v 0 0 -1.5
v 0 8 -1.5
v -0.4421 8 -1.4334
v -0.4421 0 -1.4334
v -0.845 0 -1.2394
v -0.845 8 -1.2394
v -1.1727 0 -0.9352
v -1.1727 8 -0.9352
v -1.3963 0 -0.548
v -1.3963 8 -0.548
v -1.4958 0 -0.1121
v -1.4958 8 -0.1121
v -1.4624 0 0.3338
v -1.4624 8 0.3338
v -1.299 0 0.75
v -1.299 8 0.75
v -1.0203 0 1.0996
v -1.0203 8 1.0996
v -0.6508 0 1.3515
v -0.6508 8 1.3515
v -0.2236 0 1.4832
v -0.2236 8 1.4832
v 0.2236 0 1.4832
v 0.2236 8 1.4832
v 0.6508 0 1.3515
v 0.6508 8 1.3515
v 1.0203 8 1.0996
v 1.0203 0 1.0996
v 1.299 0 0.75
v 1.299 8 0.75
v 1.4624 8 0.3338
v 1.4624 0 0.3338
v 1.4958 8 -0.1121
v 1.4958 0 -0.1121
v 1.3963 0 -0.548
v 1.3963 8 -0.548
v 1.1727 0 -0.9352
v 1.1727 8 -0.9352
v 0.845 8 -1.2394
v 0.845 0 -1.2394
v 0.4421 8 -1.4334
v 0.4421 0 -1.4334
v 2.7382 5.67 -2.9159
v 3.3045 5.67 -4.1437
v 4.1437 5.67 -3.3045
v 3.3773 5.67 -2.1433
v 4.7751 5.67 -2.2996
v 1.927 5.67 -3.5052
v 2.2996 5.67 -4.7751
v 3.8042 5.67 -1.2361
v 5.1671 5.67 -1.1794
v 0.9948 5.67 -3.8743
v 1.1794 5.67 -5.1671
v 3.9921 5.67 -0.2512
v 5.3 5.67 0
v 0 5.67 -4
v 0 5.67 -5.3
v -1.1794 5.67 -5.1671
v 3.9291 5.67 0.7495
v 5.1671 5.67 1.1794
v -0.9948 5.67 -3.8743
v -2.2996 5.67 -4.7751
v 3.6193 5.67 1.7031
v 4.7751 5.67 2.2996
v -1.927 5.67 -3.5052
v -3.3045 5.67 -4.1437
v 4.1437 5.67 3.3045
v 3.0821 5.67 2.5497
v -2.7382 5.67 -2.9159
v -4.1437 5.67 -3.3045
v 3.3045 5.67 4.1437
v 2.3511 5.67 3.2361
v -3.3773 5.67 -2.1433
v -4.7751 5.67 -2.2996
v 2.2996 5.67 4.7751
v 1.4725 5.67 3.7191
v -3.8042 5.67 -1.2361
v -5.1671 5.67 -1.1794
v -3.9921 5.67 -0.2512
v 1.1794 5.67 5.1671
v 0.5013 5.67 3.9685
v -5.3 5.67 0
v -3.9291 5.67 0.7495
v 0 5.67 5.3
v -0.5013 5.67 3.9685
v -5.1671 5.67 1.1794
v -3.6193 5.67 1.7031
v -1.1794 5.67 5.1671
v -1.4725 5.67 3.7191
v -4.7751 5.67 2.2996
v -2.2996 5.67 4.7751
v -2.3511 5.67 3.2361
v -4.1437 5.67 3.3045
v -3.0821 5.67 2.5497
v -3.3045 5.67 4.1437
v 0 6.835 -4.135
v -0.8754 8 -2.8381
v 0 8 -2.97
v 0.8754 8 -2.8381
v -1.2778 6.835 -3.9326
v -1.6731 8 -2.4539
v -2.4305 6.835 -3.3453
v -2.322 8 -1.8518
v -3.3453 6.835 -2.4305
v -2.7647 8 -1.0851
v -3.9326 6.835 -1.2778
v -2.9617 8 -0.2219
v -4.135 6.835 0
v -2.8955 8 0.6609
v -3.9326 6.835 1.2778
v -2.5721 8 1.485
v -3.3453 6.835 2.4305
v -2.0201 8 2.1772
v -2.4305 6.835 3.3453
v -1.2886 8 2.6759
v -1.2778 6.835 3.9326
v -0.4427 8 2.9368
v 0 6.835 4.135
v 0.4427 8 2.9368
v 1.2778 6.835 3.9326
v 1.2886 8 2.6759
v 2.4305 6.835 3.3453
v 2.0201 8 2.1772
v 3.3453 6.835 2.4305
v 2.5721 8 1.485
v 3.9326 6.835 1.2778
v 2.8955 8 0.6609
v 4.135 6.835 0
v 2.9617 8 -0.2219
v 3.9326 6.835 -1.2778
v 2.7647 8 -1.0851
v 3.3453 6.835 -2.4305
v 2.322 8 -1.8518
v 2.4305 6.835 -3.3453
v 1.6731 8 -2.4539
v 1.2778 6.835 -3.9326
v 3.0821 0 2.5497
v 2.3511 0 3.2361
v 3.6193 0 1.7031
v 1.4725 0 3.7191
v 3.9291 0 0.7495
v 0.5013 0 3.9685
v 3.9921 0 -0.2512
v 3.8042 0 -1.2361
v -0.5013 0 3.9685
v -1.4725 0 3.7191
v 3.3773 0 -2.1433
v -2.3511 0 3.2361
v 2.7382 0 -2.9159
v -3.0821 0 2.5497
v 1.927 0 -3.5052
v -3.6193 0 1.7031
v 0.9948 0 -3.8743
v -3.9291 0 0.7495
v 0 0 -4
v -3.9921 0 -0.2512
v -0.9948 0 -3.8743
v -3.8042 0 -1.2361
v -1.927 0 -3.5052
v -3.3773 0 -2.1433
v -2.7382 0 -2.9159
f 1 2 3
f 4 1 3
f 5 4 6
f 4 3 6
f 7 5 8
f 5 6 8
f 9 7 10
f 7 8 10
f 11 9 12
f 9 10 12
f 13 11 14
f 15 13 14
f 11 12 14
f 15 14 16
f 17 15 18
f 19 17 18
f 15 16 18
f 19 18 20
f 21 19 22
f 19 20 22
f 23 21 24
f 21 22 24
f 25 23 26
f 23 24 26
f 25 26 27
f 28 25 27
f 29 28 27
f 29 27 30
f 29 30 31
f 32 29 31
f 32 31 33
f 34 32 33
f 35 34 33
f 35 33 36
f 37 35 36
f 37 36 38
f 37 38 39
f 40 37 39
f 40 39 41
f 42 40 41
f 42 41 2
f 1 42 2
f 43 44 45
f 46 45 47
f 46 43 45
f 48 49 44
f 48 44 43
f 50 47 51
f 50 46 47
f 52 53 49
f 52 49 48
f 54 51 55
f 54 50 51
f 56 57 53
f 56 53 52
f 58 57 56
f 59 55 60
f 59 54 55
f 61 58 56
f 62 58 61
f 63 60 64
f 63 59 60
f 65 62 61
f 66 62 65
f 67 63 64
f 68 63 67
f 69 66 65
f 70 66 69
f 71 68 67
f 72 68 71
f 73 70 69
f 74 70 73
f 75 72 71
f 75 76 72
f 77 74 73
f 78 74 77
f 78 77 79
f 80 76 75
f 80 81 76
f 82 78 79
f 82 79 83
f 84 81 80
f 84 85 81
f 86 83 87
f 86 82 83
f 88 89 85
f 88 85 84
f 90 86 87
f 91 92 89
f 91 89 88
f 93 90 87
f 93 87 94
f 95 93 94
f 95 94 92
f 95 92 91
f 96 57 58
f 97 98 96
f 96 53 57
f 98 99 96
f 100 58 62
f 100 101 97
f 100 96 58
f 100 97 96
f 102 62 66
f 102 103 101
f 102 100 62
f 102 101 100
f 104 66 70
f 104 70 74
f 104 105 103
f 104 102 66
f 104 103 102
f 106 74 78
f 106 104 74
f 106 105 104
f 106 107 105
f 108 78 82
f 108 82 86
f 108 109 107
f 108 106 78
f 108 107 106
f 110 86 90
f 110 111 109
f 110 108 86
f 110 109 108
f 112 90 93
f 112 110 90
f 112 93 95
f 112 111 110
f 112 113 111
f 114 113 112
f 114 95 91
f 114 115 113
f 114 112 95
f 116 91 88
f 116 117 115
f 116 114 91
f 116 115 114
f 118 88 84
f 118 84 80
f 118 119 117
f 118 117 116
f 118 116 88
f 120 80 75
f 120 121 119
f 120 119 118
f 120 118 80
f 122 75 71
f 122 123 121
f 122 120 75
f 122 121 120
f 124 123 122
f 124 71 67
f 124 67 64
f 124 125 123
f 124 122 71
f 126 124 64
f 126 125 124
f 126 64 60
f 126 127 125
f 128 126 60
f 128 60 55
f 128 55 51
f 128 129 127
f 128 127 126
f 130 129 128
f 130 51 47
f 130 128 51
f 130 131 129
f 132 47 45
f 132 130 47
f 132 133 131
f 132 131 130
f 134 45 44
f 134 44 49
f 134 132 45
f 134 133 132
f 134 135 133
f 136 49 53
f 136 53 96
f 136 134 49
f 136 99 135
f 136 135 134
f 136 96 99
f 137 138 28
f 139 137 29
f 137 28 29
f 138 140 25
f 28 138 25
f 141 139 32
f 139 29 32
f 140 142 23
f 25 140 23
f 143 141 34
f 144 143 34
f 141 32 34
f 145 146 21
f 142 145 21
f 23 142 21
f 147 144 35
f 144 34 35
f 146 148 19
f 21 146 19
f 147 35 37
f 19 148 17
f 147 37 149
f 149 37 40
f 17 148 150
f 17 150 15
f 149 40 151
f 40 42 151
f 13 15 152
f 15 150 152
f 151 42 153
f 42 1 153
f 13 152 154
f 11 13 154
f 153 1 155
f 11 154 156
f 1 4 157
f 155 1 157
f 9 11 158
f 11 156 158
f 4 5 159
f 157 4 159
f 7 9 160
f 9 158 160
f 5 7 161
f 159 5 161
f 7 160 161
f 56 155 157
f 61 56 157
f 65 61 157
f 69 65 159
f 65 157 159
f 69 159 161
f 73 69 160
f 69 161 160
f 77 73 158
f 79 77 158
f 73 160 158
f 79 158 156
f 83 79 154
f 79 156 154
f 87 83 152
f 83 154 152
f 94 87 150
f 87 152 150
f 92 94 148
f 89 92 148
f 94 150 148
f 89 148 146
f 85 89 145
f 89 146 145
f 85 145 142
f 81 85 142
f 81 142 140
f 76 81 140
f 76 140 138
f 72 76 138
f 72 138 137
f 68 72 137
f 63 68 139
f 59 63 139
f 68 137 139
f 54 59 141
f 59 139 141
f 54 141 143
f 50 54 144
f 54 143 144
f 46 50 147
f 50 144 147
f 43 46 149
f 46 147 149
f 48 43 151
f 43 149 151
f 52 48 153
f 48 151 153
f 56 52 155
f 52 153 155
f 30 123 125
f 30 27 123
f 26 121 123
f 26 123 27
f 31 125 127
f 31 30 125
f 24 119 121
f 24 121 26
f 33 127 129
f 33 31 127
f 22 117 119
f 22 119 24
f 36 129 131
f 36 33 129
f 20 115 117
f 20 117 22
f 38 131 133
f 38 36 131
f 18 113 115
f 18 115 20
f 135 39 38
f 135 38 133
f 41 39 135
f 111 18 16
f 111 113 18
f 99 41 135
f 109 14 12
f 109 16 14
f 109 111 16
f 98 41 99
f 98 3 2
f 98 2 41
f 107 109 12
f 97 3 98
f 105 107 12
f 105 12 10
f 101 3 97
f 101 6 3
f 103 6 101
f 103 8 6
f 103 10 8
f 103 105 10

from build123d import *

# Parameters (mm, degrees)
SKETCH_1_R          = 4
SKETCH_1_R_2        = 1.5
EXTRUDE_1_DEPTH     = 5.67
SKETCH_3_R          = 1.5
CUT_EXTRUDE_1_DEPTH = 11.96266391


with BuildPart() as part:
    # 草图1 → 凸台-拉伸1 (new body)
    with BuildSketch(Plane(origin=(0, 0, 0), x_dir=(1, 0, 0), z_dir=(0, 1, 0))):
        with Locations(Location((0, 0, 0), (0, 0, 90))):
            Circle(SKETCH_1_R)
        with Locations(Location((0, 0, 0), (0, 0, 90))):
            Circle(SKETCH_1_R_2, mode=Mode.SUBTRACT)
    extrude(amount=EXTRUDE_1_DEPTH)

    # 草图2 → 旋转1 (revolve)
    with BuildSketch(Plane.XY, mode=Mode.PRIVATE) as revolve_1_sk:
        Polygon((0, 5.67), (5.3, 5.67), (2.97, 8), (0, 8), align=None)
    revolve(revolve_1_sk.sketch.rotate(Axis((0, 5.67, 0), (0, 1, 0)), 90), axis=Axis((0, 5.67, 0), (0, 1, 0)))

    # 草图3 → 切除-拉伸1 (cut, through all)
    with BuildSketch(Plane(origin=(0, 8, 0), x_dir=(1, 0, 0), z_dir=(0, 1, 0))):
        with Locations(Location((0, 0, 0), (0, 0, 90))):
            Circle(SKETCH_3_R)
    extrude(amount=-CUT_EXTRUDE_1_DEPTH, mode=Mode.SUBTRACT)


solid = part.part
